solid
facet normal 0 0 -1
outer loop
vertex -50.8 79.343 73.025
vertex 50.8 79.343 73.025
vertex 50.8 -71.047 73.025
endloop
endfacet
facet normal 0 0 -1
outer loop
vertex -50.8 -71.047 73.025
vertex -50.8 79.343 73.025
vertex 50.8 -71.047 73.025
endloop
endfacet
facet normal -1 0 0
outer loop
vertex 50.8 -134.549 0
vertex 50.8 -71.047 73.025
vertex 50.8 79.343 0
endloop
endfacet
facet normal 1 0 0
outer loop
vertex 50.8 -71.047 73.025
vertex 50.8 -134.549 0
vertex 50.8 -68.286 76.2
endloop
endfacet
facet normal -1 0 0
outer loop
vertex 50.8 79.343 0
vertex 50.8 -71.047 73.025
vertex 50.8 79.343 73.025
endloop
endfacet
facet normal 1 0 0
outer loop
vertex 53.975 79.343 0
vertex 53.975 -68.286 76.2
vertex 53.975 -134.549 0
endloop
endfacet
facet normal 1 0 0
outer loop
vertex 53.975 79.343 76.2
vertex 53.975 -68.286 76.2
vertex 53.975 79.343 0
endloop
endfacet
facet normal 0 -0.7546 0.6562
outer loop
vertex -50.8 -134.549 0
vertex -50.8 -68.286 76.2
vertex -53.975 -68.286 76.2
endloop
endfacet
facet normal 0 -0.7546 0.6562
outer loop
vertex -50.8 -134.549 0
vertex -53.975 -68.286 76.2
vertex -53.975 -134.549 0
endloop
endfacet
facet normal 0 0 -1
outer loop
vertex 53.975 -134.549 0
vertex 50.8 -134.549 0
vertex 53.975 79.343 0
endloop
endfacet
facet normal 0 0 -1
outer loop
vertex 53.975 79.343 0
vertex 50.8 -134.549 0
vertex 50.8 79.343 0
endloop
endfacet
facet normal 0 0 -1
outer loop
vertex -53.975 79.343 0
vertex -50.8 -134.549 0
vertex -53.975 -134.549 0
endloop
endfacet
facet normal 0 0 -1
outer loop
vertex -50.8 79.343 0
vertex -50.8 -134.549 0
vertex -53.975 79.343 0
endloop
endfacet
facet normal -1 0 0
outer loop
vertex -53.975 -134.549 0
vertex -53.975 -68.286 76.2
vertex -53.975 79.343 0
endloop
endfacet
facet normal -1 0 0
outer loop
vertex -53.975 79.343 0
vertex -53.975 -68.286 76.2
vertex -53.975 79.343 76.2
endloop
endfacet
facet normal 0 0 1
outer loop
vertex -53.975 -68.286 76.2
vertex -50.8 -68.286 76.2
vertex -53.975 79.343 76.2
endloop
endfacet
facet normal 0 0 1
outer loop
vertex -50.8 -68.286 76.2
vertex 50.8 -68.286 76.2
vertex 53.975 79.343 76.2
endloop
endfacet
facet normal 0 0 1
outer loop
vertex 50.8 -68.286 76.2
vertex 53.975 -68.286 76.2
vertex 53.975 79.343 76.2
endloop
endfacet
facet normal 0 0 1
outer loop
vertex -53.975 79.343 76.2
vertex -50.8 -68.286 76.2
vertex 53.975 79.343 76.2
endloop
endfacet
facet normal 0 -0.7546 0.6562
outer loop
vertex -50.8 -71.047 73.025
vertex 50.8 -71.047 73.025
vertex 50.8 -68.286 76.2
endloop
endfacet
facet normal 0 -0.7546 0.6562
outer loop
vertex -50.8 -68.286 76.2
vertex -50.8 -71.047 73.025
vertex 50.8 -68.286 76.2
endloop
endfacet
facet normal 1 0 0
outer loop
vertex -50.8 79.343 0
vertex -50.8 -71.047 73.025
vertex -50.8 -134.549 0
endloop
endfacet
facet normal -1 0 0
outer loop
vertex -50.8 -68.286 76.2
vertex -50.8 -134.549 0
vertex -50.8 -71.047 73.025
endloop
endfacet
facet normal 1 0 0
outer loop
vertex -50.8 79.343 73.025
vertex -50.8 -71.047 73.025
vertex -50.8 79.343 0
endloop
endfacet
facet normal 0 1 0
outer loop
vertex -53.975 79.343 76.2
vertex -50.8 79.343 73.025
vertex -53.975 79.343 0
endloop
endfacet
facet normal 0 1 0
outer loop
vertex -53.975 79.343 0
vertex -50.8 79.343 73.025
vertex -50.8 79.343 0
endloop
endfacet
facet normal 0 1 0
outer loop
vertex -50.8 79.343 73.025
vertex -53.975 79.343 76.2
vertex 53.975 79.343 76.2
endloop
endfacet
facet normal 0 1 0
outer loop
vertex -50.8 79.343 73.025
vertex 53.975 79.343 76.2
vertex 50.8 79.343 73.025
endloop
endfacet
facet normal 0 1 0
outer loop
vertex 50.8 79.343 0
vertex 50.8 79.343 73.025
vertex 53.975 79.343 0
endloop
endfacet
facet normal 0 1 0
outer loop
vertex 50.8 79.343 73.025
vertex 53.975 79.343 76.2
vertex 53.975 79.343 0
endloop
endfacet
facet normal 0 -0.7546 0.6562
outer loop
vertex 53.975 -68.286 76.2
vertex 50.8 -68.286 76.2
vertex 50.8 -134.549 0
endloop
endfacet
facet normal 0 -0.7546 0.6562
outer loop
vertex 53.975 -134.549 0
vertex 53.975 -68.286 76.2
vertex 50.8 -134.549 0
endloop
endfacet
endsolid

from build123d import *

# Parameters (mm, degrees)
F2_DEPTH = 3.175
F5_DEPTH = 101.6


with BuildPart() as f2:
    # F1 (on offset) → F2 (new body)
    with BuildSketch(Plane.YZ.offset(50.8)):
        Polygon((-68.286333, 76.2), (-134.548811, 0), (79.343306, 0), (79.343306, 76.2), align=None)
    extrude(amount=F2_DEPTH)



with BuildPart() as f3_1:
    # F3: instance of F2
    add(f2.part.mirror(Plane.YZ))


with BuildPart() as f2_1:
    add(f2.part)

    add(f3_1.part)  # F5 merges F3_1
    # F4 (on face) → F5 (join, through all)
    with BuildSketch(Plane(origin=(50.8, 0, 0), x_dir=(0, -1, 0), z_dir=(-1, 0, 0))):
        Polygon((68.286333, 76.2), (-79.343306, 76.2), (-79.343306, 73.025), (71.047269, 73.025), align=None)
    extrude(amount=F5_DEPTH)


solid = f2_1.part
